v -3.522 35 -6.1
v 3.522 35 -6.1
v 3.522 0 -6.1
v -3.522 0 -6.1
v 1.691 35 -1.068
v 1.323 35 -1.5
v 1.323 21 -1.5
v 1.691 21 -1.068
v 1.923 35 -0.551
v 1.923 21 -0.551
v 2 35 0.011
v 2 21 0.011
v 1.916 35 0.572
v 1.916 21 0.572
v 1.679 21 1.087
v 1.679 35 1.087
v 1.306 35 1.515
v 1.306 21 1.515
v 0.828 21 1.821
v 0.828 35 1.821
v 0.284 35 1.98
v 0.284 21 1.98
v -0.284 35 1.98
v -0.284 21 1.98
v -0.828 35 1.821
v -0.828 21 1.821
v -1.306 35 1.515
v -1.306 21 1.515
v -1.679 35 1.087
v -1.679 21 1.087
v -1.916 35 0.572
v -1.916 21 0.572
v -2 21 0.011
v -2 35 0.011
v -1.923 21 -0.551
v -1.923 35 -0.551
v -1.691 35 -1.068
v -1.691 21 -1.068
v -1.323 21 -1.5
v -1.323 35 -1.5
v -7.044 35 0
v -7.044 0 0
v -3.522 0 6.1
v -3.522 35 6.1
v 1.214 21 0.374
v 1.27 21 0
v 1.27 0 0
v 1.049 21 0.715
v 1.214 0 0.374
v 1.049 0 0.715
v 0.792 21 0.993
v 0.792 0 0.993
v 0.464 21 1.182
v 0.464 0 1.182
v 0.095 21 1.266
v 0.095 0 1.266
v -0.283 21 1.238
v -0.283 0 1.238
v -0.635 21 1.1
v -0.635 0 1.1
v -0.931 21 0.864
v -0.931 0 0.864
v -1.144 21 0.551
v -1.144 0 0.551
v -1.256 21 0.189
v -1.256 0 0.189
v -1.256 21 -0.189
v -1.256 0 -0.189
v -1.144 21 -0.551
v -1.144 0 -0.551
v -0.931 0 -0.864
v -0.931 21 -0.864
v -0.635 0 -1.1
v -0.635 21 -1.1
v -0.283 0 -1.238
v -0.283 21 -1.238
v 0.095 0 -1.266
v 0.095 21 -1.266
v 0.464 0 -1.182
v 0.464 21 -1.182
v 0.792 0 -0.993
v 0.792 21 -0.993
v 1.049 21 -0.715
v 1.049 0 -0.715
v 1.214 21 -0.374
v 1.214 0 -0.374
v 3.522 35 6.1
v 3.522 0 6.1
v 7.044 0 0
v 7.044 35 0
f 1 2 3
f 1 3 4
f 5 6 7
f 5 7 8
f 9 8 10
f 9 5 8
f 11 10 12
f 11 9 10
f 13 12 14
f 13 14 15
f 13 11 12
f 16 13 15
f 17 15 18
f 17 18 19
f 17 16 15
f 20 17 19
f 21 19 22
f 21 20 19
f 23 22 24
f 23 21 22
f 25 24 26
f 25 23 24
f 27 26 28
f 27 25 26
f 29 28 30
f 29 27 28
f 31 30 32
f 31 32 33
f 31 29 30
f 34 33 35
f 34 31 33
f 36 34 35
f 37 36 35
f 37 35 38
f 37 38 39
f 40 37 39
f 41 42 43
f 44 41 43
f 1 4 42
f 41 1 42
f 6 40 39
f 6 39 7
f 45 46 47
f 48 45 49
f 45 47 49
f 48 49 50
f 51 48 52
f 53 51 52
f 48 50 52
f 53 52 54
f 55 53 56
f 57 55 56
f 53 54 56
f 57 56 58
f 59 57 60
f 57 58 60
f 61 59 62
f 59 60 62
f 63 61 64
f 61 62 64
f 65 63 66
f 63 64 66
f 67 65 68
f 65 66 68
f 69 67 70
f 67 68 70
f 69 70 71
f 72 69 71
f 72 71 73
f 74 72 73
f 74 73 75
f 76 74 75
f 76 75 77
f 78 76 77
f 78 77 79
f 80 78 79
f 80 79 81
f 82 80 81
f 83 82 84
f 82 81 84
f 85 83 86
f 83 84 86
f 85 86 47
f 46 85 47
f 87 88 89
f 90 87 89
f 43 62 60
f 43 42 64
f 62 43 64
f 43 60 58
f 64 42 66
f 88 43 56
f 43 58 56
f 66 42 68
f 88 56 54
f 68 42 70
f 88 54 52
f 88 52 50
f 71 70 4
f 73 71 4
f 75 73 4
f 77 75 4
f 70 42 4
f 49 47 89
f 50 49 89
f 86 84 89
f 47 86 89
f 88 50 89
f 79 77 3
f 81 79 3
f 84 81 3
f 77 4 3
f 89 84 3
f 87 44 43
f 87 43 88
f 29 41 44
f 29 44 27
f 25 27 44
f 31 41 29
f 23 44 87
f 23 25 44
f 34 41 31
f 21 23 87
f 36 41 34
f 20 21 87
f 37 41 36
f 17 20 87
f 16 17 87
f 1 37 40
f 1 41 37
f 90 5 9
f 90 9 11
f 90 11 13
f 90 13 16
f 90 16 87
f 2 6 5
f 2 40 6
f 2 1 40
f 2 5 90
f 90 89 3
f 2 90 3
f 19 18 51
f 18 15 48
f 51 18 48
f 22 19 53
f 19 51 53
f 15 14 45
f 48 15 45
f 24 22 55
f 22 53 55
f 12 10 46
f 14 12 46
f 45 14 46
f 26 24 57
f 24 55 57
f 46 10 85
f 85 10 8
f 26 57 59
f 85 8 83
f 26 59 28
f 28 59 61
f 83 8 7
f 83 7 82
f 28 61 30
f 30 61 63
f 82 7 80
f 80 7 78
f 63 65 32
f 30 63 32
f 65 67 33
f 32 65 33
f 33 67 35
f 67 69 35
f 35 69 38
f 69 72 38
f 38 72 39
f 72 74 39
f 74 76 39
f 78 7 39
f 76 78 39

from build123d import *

# Parameters (mm, degrees)
BOSS_EXTRUDE2_DEPTH = 35
SKETCH6_R           = 1.27
CUT_EXTRUDE2_DEPTH  = 21
CUT_EXTRUDE3_DEPTH  = 14


with BuildPart() as part:
    # Sketch1 → Boss-Extrude2 (new body)
    with BuildSketch(Plane(origin=(0, 0, 0), x_dir=(1, 0, 0), z_dir=(0, 1, 0))):
        Polygon((3.521836642, 6.1), (-3.521836642, 6.1), (-7.043673284, 0), (-3.521836642, -6.1), (3.521836642, -6.1), (7.043673284, 0), align=None)
    extrude(amount=BOSS_EXTRUDE2_DEPTH)

    # Sketch6 → Cut-Extrude2 (cut)
    with BuildSketch(Plane.XZ):
        Circle(SKETCH6_R)
    extrude(amount=-CUT_EXTRUDE2_DEPTH, mode=Mode.SUBTRACT)

    # Sketch7 → Cut-Extrude3 (cut)
    with BuildSketch(Plane(origin=(0, 35, 0), x_dir=(1, 0, 0), z_dir=(0, 1, 0))):
        with BuildLine():
            Line((-1.322875656, 1.5), (1.322875656, 1.5))
            ThreePointArc((1.322875656, 1.5), (0, -2), (-1.322875656, 1.5))
        make_face()
    extrude(amount=-CUT_EXTRUDE3_DEPTH, mode=Mode.SUBTRACT)


solid = part.part
